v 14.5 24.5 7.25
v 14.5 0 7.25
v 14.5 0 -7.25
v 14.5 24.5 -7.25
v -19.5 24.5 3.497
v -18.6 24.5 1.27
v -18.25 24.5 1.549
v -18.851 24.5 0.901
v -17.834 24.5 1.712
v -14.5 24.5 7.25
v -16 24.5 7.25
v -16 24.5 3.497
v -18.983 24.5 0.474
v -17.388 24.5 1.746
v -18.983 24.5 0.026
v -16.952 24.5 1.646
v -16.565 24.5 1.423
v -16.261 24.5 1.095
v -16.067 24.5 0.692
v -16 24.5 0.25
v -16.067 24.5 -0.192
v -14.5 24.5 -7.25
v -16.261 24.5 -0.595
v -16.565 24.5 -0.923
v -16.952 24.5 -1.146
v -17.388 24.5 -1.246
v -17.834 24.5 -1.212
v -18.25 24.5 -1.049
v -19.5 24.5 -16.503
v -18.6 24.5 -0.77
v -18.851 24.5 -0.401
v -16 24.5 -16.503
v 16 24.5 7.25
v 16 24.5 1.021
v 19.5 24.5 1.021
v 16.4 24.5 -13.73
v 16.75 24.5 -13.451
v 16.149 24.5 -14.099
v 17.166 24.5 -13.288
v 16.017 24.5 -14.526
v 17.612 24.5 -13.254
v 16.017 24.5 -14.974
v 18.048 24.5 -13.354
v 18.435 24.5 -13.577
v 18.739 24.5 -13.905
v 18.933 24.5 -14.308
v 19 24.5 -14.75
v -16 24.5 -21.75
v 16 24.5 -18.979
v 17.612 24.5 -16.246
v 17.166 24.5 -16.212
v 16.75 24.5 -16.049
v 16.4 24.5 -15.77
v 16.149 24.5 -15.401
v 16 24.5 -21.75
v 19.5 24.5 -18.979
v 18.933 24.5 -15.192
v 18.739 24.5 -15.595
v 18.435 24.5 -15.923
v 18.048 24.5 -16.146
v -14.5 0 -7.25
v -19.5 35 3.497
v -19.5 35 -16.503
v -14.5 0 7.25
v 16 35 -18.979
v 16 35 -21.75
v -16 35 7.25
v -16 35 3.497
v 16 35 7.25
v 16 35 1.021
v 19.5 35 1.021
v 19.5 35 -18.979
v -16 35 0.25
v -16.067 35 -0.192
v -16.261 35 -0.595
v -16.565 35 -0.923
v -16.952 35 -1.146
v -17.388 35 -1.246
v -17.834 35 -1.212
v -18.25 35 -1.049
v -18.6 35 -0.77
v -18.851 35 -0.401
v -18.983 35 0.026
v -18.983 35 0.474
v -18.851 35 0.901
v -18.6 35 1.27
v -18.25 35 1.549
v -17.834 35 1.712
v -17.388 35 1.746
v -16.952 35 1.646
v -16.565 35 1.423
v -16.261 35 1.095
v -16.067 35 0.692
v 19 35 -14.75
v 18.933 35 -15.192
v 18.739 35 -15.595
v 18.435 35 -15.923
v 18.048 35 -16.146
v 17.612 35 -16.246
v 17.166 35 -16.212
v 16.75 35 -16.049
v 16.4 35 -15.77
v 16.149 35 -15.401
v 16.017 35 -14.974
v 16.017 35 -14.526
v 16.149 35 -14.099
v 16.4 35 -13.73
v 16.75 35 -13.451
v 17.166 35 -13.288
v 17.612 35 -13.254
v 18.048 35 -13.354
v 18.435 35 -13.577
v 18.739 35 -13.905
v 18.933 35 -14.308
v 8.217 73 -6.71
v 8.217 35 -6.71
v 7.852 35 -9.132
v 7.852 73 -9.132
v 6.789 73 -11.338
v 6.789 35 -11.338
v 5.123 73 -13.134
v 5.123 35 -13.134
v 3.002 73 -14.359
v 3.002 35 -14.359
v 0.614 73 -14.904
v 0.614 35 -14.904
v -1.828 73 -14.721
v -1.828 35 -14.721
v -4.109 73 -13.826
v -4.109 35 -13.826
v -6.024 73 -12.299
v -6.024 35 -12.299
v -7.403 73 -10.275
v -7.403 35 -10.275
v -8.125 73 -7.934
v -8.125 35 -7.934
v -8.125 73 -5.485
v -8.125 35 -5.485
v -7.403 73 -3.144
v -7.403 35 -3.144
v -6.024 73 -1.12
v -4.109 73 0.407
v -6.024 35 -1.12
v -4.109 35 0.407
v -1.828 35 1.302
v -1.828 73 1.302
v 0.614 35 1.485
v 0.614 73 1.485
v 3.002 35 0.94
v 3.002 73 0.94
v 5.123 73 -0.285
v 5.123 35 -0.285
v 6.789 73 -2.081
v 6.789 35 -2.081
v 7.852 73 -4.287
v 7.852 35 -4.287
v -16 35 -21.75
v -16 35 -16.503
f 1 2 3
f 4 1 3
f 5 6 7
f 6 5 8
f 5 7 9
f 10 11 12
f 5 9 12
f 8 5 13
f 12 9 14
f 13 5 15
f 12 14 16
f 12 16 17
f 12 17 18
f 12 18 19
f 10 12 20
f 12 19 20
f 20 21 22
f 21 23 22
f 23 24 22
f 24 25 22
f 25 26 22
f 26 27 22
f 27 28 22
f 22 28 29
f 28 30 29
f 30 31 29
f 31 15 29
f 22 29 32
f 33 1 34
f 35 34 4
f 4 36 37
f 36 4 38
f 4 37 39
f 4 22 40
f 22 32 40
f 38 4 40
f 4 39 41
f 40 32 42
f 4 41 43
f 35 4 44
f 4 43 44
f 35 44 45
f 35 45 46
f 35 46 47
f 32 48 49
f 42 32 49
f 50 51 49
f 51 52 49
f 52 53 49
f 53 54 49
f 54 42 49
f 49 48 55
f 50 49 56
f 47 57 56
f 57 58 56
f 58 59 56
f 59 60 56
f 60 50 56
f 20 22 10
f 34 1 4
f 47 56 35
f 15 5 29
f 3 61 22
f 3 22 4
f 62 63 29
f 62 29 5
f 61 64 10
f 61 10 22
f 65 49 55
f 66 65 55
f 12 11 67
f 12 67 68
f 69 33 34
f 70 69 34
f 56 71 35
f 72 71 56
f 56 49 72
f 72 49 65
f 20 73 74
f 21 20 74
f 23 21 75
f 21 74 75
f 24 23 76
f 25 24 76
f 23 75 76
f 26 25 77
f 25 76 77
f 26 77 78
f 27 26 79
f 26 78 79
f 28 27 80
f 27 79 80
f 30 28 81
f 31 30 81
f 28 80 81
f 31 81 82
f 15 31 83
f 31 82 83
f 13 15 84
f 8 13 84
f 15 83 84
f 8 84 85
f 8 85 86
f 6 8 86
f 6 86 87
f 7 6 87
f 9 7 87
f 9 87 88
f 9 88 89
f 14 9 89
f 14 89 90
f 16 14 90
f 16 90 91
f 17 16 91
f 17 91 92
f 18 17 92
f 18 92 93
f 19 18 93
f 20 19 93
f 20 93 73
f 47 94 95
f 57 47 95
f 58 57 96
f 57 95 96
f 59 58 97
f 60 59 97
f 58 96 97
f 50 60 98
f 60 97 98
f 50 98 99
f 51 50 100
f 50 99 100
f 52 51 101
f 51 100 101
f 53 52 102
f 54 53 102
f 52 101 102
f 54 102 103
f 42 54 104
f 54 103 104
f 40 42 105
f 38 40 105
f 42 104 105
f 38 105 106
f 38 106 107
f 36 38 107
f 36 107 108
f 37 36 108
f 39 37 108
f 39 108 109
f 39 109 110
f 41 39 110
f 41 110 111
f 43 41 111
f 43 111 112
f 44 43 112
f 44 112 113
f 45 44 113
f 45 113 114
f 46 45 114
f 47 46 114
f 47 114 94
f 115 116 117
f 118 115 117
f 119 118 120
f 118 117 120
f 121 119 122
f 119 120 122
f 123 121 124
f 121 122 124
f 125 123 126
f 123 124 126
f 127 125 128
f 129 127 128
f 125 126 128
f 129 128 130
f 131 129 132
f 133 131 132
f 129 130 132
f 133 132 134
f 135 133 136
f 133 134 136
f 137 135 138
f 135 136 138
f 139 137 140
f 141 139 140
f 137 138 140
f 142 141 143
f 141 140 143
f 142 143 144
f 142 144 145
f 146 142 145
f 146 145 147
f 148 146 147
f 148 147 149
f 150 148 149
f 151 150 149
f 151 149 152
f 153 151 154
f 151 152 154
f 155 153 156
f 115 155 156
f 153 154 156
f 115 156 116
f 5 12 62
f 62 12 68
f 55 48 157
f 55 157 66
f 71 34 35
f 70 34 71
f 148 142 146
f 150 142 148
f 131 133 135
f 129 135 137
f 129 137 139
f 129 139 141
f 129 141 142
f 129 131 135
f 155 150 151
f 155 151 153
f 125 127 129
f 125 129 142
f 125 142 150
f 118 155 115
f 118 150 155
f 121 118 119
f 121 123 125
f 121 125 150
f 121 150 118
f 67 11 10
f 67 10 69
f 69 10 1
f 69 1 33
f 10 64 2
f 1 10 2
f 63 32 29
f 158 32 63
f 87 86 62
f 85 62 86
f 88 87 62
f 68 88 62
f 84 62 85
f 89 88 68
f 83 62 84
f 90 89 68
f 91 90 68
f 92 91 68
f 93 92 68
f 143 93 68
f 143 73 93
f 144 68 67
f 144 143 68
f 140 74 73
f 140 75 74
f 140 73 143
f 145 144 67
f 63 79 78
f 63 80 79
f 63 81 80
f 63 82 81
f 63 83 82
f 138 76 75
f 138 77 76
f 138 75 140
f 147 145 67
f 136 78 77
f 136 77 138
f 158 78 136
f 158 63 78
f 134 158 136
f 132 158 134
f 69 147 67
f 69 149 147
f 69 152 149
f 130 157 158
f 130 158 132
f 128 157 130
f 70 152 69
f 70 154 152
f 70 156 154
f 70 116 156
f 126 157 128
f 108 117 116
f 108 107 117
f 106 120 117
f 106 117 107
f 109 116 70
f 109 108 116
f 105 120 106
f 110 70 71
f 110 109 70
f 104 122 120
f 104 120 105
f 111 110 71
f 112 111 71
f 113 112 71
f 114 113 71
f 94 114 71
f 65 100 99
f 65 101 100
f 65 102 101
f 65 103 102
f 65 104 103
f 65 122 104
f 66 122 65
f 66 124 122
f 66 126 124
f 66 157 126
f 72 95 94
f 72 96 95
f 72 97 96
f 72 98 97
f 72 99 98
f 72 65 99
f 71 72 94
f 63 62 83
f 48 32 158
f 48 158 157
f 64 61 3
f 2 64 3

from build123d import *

# Parameters (mm, degrees)
SKETCH_1_W          = 29
SKETCH_1_H          = 14.5
EXTRUDE_1_DEPTH     = 24.5
SKETCH_3_W          = 32
SKETCH_3_H          = 29
EXTRUDE_3_DEPTH     = 10.5
SKETCH_6_W          = 20
SKETCH_6_H          = 10.5
EXTRUDE_5_DEPTH     = 3.5
SKETCH_8_W          = 20
SKETCH_8_H          = 10.5
EXTRUDE_6_DEPTH     = 3.5
SKETCH_9_R          = 1.5
CUT_EXTRUDE_1_DEPTH = 36
SKETCH_11_R         = 8.217115379
EXTRUDE_7_DEPTH     = 38


with BuildPart() as part:
    # 草圖1 → 填料-伸長1 (new body)
    with BuildSketch(Plane(origin=(0, 0, 0), x_dir=(1, 0, 0), z_dir=(0, 1, 0))):
        Rectangle(SKETCH_1_W, SKETCH_1_H)
    extrude(amount=EXTRUDE_1_DEPTH)

    # 草圖3 → 填料-伸長3 (add)
    with BuildSketch(Plane(origin=(0, 24.5, 0), x_dir=(1, 0, 0), z_dir=(0, 1, 0))):
        with Locations((0, 7.25)):
            Rectangle(SKETCH_3_W, SKETCH_3_H)
    extrude(amount=EXTRUDE_3_DEPTH)

    # 草圖6 → 填料-伸長5 (add)
    with BuildSketch(Plane(origin=(16, 0, 0), x_dir=(0, 0, -1), z_dir=(1, 0, 0))):
        with Locations((8.978907639, 29.75)):
            Rectangle(SKETCH_6_W, SKETCH_6_H)
    extrude(amount=EXTRUDE_5_DEPTH)

    # 草圖8 → 填料-伸長6 (add)
    with BuildSketch(Plane.ZY.offset(16)):
        with Locations((-6.503080988, 29.75)):
            Rectangle(SKETCH_8_W, SKETCH_8_H)
    extrude(amount=EXTRUDE_6_DEPTH)

    # 草圖9 → 除料-伸長1 (cut, through all)
    with BuildSketch(Plane(origin=(0, 35, 0), x_dir=(1, 0, 0), z_dir=(0, 1, 0))):
        with Locations((17.5, 14.75)):
            Circle(SKETCH_9_R)
        with Locations((-17.5, -0.25)):
            Circle(SKETCH_9_R)
    extrude(amount=-CUT_EXTRUDE_1_DEPTH, mode=Mode.SUBTRACT)

    # 草圖11 → 填料-伸長7 (add)
    with BuildSketch(Plane(origin=(0, 35, 0), x_dir=(1, 0, 0), z_dir=(0, 1, 0))):
        with Locations((0, 6.709500823)):
            Circle(SKETCH_11_R)
    extrude(amount=EXTRUDE_7_DEPTH)


solid = part.part
